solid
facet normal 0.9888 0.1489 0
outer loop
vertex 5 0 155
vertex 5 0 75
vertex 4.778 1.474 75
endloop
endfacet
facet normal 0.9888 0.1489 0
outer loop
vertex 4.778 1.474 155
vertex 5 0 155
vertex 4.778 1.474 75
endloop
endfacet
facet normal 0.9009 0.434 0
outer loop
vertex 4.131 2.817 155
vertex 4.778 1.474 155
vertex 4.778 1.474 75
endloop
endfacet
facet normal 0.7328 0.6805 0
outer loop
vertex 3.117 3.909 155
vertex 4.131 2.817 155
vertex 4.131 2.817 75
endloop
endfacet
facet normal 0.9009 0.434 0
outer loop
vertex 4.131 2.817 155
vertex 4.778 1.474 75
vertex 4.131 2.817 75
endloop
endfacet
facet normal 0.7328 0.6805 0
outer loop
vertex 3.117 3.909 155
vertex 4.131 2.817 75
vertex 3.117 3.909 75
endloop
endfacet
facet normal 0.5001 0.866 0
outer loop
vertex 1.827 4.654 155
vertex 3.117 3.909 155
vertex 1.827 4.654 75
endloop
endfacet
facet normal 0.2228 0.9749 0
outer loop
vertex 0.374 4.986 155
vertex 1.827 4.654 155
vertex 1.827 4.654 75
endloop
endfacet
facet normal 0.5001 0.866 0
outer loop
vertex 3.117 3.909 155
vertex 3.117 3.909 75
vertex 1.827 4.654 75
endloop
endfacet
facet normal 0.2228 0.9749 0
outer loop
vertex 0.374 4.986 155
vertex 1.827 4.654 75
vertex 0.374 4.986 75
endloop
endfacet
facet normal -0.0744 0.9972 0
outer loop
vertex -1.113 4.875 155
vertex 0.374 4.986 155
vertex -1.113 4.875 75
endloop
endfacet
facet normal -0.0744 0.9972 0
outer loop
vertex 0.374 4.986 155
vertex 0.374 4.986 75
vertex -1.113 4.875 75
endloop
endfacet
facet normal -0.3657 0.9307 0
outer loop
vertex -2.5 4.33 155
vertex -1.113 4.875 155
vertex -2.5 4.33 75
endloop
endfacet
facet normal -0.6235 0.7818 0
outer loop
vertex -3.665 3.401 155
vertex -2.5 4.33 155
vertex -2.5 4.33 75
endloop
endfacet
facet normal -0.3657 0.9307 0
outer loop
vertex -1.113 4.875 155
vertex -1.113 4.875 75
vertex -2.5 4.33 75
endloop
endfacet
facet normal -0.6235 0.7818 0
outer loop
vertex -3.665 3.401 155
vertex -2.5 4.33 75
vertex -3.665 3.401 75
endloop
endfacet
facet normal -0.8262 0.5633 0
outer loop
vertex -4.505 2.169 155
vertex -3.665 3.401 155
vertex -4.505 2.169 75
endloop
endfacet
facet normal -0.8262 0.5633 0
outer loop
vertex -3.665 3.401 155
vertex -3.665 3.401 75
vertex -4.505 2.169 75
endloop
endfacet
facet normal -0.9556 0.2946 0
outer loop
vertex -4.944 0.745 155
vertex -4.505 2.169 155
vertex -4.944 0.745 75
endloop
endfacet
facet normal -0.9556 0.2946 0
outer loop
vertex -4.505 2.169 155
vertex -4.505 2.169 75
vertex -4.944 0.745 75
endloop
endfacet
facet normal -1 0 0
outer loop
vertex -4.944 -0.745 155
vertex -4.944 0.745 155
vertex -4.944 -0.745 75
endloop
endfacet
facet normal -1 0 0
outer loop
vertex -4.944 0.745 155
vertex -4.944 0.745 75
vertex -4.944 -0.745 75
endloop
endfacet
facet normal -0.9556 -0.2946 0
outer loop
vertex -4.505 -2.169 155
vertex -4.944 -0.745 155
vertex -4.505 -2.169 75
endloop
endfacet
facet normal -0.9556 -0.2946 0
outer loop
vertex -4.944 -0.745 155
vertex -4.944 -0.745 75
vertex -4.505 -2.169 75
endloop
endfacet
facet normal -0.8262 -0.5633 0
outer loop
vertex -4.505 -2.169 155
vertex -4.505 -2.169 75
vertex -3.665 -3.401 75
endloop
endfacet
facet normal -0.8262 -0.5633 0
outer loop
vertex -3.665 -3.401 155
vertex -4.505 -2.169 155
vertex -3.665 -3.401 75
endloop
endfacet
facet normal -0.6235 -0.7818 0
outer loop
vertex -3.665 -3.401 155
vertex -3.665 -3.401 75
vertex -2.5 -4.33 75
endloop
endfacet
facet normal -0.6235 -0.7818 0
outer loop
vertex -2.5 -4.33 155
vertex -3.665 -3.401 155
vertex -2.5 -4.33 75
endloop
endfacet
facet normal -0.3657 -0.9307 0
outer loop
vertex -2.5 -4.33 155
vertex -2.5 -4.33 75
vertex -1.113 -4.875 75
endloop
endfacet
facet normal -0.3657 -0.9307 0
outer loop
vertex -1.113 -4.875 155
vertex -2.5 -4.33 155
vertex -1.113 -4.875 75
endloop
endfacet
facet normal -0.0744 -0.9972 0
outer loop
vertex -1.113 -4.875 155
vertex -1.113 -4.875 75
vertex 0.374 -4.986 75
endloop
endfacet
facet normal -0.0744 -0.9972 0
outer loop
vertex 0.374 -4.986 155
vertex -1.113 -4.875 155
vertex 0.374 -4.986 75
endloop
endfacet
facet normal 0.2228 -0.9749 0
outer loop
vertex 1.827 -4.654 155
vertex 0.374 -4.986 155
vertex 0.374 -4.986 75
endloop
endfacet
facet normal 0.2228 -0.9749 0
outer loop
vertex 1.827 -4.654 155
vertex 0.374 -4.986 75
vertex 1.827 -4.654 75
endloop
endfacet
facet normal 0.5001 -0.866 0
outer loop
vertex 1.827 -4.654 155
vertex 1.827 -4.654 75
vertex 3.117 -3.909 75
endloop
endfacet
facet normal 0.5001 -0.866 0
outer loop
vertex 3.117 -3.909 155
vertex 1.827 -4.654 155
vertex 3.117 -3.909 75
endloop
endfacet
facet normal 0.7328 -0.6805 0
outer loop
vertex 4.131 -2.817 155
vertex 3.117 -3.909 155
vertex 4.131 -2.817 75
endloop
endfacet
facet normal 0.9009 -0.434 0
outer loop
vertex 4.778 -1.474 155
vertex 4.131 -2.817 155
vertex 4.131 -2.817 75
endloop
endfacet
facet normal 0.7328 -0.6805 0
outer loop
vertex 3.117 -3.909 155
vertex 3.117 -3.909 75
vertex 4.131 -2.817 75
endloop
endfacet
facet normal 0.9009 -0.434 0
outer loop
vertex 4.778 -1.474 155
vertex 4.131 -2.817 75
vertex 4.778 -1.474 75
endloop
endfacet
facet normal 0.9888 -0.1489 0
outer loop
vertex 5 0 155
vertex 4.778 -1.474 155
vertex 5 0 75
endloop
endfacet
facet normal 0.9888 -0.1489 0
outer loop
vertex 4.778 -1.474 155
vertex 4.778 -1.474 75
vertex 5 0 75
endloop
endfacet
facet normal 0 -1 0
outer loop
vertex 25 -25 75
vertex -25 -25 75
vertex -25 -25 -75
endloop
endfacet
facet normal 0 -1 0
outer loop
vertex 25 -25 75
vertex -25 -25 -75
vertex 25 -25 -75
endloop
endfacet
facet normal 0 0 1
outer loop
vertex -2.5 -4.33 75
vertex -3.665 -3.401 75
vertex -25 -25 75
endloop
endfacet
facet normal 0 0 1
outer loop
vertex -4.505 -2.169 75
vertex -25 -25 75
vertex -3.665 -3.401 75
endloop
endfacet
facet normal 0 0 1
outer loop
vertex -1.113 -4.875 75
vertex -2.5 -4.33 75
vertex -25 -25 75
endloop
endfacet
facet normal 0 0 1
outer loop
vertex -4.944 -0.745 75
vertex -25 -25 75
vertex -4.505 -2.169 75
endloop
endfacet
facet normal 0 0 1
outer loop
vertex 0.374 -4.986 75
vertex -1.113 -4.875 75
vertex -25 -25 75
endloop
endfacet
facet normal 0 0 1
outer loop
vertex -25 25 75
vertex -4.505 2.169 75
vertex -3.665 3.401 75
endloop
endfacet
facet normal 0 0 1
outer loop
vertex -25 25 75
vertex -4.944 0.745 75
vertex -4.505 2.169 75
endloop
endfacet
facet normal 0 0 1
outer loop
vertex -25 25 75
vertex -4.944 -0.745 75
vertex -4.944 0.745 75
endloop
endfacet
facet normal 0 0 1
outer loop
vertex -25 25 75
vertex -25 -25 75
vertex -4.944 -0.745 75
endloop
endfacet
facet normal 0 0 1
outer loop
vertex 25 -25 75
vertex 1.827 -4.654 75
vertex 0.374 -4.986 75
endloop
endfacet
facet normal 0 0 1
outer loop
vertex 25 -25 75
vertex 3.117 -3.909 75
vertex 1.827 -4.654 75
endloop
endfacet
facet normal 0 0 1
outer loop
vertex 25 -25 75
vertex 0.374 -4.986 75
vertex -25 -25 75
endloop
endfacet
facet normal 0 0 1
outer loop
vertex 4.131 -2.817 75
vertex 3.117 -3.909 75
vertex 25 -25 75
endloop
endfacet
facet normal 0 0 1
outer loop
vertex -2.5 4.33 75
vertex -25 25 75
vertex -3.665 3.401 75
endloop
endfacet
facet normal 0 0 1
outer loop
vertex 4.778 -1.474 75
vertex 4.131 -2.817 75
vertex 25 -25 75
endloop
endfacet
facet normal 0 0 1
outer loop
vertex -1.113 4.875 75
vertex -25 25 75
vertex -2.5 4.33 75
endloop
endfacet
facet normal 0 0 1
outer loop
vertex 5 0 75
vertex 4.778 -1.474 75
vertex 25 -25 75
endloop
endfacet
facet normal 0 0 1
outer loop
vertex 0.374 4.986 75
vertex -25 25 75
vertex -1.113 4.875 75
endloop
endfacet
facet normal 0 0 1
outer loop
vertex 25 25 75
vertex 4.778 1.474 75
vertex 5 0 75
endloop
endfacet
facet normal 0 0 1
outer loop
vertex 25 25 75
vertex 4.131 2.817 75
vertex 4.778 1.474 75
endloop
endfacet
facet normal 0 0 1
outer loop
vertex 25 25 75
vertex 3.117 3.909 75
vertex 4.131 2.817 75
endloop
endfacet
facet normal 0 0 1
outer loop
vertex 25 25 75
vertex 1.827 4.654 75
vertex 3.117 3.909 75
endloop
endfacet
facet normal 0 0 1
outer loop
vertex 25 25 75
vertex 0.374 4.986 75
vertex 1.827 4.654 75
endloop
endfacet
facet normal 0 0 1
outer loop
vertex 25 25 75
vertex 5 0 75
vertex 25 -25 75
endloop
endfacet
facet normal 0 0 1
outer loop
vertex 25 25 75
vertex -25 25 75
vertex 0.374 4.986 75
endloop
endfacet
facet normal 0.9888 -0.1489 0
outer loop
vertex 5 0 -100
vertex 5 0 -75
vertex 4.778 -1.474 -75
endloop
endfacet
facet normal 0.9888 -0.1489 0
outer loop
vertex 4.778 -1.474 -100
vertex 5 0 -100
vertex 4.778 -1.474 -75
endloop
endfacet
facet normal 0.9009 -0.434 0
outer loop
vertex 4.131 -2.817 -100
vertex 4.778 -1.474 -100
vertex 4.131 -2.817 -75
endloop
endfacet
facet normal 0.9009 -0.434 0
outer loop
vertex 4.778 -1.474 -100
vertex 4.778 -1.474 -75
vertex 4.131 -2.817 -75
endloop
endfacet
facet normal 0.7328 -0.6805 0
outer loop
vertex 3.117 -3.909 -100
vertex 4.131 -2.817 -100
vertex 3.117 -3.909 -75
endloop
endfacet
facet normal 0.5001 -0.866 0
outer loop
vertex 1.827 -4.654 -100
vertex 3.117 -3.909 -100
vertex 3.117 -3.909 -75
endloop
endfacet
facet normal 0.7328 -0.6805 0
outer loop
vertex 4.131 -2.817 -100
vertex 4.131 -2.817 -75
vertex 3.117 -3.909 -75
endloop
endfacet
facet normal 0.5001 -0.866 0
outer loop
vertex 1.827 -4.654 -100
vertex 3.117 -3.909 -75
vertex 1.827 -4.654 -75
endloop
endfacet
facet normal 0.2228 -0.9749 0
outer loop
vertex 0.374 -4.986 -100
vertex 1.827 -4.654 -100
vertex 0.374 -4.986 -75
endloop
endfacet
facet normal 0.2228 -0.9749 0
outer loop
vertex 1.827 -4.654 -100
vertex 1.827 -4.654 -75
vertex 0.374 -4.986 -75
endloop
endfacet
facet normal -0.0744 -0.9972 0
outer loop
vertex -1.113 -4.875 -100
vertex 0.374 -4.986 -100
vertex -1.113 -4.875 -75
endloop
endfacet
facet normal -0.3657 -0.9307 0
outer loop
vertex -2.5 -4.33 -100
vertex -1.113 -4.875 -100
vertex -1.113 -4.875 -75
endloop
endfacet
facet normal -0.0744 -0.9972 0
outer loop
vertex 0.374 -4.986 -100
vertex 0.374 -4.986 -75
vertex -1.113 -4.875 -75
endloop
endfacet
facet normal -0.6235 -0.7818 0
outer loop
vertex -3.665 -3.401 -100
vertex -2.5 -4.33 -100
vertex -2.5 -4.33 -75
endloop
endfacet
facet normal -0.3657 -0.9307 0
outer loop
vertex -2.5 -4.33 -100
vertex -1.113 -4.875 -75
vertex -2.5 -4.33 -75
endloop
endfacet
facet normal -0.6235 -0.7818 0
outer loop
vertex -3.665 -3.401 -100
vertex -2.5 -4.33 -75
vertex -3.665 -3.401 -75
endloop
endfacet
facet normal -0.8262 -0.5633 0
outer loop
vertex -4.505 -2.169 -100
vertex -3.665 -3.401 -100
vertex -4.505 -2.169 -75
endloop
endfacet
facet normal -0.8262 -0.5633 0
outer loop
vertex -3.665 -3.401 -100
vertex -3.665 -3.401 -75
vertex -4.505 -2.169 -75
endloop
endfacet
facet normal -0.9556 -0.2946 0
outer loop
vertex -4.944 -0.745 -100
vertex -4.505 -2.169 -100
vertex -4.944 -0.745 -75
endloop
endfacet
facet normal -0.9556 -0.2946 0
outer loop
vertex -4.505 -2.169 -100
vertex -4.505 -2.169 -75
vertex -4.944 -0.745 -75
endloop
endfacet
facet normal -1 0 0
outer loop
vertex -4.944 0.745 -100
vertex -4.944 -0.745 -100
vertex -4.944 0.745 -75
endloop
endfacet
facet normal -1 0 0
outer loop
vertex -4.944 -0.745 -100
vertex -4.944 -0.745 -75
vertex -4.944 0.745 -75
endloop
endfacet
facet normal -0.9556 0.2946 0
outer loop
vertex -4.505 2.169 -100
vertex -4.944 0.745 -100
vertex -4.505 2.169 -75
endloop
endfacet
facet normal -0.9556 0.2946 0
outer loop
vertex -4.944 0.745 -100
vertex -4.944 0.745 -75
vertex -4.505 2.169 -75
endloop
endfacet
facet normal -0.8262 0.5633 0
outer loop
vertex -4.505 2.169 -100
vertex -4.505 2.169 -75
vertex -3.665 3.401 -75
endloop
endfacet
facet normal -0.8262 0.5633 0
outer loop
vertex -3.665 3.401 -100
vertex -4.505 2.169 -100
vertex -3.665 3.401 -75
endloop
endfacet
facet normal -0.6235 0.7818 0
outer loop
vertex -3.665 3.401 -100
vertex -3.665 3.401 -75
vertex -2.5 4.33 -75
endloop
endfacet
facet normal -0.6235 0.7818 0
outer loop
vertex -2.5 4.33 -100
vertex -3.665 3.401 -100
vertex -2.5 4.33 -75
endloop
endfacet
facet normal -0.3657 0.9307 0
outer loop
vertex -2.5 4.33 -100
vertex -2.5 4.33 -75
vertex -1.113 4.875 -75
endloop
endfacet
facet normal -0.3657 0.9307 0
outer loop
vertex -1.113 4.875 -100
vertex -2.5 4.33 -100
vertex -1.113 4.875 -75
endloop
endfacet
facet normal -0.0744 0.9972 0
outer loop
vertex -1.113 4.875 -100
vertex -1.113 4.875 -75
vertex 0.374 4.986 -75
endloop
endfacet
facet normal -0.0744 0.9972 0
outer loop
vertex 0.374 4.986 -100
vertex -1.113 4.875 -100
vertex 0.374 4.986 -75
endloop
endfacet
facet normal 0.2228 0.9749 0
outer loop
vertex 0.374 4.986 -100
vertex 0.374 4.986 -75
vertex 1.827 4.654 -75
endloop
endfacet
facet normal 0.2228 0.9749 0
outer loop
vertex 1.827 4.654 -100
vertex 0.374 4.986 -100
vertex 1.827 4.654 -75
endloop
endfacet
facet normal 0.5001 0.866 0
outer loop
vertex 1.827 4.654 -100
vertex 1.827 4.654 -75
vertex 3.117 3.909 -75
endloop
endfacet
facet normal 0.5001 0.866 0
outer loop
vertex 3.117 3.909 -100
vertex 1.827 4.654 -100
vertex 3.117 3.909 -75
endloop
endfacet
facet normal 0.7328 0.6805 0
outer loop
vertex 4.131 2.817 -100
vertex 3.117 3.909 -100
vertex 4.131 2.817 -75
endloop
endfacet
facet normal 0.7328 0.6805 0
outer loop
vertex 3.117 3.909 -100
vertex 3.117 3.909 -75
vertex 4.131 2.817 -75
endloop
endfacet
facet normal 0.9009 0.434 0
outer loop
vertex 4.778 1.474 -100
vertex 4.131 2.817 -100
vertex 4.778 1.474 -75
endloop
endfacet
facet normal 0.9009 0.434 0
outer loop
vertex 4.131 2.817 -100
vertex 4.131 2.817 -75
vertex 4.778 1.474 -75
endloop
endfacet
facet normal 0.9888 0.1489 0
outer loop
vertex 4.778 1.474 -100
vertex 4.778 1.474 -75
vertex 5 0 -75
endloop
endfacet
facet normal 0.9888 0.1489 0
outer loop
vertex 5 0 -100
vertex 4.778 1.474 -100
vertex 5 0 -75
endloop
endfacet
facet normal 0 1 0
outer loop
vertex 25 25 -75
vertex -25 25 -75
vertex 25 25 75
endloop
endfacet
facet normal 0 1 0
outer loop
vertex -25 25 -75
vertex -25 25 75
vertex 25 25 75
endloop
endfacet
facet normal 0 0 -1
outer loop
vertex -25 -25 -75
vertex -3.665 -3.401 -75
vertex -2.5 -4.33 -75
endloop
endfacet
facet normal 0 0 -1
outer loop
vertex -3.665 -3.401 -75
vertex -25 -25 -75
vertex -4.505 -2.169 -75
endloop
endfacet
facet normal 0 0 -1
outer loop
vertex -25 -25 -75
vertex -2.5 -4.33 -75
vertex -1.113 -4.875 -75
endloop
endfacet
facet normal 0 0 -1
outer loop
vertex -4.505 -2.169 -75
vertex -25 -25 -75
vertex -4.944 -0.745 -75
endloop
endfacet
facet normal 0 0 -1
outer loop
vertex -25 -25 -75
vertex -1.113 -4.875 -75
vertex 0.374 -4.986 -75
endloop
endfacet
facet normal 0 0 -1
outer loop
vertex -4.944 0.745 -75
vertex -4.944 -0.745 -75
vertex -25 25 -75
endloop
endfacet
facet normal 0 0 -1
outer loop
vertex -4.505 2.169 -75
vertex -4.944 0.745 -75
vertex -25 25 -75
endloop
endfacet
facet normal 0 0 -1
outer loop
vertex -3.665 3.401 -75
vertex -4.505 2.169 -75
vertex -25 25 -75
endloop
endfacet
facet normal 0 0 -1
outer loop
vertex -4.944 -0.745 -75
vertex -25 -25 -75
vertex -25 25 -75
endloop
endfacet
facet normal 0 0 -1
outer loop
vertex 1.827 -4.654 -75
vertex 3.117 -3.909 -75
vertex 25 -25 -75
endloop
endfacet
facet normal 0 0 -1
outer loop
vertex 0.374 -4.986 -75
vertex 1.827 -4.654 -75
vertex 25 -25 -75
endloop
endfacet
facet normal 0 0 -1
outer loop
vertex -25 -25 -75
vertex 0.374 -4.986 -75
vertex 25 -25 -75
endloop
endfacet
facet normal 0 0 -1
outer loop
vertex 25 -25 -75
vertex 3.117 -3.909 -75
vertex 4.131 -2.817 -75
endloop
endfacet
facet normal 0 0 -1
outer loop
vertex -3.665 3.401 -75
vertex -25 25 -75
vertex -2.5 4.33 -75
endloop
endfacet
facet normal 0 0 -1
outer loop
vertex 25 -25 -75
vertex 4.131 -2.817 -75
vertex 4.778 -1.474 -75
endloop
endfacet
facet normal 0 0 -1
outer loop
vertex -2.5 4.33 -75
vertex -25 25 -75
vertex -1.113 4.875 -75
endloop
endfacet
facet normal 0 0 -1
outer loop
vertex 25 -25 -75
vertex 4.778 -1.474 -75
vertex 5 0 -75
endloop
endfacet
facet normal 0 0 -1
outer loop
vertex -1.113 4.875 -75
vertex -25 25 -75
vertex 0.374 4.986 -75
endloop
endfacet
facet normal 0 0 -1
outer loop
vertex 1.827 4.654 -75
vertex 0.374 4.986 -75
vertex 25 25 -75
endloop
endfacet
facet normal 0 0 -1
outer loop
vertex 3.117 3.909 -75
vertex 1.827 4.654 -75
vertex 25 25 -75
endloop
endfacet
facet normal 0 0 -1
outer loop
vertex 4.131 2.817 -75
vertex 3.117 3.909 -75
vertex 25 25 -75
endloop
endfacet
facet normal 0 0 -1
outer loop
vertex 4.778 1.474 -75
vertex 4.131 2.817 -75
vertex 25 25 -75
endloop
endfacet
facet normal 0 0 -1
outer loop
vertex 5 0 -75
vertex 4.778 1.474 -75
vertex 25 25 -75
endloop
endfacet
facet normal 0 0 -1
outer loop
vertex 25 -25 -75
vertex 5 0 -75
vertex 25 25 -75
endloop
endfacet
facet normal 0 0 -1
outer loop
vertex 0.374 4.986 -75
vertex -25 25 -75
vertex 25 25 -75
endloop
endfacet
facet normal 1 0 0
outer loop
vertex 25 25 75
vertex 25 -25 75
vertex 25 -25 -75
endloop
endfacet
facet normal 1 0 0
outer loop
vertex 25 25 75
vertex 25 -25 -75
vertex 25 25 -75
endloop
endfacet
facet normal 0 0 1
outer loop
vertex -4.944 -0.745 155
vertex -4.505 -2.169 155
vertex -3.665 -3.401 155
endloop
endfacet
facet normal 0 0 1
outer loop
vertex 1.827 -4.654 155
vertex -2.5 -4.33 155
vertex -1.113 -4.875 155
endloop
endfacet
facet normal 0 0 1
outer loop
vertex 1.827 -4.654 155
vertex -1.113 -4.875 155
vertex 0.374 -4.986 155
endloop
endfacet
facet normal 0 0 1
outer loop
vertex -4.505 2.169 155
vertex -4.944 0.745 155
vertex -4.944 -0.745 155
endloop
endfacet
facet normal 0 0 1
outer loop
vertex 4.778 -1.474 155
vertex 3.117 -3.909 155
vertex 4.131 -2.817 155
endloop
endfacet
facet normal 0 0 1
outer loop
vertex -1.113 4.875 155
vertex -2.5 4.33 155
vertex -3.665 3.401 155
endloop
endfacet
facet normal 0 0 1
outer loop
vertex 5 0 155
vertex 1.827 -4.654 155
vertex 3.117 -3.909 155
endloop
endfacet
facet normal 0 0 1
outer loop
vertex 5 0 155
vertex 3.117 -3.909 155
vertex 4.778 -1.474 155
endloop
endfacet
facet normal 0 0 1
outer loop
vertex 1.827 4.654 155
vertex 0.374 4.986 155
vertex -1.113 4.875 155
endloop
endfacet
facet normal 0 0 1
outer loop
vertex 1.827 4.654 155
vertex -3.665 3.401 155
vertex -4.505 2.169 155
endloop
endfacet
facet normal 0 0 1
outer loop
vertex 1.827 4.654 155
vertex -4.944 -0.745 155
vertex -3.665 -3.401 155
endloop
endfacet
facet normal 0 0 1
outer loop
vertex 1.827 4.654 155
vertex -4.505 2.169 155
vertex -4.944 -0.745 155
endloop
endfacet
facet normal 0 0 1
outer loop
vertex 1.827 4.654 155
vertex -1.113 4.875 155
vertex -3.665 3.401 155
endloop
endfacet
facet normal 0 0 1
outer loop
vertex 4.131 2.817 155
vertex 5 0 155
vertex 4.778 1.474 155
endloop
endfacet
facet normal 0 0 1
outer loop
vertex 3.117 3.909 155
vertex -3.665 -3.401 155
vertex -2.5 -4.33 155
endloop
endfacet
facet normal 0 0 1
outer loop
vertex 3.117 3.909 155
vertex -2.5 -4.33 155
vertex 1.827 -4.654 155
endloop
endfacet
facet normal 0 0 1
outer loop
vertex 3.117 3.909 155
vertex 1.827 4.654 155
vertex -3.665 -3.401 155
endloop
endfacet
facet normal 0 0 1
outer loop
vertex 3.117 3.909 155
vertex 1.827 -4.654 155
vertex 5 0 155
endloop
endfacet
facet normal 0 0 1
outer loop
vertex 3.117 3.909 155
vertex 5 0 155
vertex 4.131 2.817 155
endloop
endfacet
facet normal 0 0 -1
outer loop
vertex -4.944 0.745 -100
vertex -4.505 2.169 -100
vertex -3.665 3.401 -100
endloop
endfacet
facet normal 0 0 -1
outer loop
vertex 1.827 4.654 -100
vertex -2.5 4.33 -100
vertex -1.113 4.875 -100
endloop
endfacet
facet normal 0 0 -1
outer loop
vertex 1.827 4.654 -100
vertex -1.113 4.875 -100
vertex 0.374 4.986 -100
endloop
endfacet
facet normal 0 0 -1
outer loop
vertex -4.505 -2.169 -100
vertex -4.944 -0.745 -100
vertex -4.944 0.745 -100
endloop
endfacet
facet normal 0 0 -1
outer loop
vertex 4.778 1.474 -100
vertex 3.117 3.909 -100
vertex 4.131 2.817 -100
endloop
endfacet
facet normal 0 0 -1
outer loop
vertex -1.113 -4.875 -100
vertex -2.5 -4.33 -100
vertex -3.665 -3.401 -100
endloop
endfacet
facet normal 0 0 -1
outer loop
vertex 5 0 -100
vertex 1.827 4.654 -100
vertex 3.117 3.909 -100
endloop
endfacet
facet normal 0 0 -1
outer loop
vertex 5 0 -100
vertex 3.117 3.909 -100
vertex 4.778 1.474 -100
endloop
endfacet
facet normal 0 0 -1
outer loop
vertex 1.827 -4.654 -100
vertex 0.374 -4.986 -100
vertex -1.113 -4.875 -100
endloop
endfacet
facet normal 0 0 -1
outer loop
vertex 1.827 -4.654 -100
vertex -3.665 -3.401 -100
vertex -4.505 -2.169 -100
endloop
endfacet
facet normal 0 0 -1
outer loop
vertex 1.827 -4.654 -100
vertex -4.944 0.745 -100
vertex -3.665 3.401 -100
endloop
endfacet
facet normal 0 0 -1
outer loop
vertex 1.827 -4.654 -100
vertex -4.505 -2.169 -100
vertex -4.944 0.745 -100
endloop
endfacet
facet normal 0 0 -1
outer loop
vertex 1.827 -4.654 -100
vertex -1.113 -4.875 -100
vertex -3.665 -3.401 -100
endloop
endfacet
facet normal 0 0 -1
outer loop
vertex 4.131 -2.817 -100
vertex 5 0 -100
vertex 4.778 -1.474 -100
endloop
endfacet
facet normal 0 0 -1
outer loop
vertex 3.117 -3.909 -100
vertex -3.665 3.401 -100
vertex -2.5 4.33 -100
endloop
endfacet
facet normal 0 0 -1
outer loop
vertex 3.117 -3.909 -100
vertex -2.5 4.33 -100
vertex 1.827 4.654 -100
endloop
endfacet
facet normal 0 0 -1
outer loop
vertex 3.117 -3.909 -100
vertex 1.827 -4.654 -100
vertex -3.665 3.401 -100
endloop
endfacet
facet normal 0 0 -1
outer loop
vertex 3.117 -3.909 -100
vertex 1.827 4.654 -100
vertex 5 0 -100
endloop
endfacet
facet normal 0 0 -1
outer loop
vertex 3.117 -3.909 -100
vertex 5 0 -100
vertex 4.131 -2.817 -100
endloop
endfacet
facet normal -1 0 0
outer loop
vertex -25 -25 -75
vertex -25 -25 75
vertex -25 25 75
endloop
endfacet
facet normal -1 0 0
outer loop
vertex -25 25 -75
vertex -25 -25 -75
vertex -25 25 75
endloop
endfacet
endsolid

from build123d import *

# Parameters (mm, degrees)
F0_W     = 50
F0_H     = 50
F1_DEPTH = 75
F2_R     = 5
F3_DEPTH = 80
F4_R     = 5
F5_DEPTH = 25


with BuildPart() as f1:
    # F0 (on Top) → F1 (new body, symmetric)
    with BuildSketch(Plane.XY):
        Rectangle(F0_W, F0_H)
    extrude(amount=F1_DEPTH, both=True)

    # F2 (on face) → F3 (join)
    with BuildSketch(Plane.XY.offset(75)):
        Circle(F2_R)
    extrude(amount=F3_DEPTH)

    # F4 (on face) → F5 (join)
    with BuildSketch(Plane(origin=(0, 0, -75), x_dir=(1, 0, 0), z_dir=(0, 0, -1))):
        Circle(F4_R)
    extrude(amount=F5_DEPTH)


solid = f1.part
